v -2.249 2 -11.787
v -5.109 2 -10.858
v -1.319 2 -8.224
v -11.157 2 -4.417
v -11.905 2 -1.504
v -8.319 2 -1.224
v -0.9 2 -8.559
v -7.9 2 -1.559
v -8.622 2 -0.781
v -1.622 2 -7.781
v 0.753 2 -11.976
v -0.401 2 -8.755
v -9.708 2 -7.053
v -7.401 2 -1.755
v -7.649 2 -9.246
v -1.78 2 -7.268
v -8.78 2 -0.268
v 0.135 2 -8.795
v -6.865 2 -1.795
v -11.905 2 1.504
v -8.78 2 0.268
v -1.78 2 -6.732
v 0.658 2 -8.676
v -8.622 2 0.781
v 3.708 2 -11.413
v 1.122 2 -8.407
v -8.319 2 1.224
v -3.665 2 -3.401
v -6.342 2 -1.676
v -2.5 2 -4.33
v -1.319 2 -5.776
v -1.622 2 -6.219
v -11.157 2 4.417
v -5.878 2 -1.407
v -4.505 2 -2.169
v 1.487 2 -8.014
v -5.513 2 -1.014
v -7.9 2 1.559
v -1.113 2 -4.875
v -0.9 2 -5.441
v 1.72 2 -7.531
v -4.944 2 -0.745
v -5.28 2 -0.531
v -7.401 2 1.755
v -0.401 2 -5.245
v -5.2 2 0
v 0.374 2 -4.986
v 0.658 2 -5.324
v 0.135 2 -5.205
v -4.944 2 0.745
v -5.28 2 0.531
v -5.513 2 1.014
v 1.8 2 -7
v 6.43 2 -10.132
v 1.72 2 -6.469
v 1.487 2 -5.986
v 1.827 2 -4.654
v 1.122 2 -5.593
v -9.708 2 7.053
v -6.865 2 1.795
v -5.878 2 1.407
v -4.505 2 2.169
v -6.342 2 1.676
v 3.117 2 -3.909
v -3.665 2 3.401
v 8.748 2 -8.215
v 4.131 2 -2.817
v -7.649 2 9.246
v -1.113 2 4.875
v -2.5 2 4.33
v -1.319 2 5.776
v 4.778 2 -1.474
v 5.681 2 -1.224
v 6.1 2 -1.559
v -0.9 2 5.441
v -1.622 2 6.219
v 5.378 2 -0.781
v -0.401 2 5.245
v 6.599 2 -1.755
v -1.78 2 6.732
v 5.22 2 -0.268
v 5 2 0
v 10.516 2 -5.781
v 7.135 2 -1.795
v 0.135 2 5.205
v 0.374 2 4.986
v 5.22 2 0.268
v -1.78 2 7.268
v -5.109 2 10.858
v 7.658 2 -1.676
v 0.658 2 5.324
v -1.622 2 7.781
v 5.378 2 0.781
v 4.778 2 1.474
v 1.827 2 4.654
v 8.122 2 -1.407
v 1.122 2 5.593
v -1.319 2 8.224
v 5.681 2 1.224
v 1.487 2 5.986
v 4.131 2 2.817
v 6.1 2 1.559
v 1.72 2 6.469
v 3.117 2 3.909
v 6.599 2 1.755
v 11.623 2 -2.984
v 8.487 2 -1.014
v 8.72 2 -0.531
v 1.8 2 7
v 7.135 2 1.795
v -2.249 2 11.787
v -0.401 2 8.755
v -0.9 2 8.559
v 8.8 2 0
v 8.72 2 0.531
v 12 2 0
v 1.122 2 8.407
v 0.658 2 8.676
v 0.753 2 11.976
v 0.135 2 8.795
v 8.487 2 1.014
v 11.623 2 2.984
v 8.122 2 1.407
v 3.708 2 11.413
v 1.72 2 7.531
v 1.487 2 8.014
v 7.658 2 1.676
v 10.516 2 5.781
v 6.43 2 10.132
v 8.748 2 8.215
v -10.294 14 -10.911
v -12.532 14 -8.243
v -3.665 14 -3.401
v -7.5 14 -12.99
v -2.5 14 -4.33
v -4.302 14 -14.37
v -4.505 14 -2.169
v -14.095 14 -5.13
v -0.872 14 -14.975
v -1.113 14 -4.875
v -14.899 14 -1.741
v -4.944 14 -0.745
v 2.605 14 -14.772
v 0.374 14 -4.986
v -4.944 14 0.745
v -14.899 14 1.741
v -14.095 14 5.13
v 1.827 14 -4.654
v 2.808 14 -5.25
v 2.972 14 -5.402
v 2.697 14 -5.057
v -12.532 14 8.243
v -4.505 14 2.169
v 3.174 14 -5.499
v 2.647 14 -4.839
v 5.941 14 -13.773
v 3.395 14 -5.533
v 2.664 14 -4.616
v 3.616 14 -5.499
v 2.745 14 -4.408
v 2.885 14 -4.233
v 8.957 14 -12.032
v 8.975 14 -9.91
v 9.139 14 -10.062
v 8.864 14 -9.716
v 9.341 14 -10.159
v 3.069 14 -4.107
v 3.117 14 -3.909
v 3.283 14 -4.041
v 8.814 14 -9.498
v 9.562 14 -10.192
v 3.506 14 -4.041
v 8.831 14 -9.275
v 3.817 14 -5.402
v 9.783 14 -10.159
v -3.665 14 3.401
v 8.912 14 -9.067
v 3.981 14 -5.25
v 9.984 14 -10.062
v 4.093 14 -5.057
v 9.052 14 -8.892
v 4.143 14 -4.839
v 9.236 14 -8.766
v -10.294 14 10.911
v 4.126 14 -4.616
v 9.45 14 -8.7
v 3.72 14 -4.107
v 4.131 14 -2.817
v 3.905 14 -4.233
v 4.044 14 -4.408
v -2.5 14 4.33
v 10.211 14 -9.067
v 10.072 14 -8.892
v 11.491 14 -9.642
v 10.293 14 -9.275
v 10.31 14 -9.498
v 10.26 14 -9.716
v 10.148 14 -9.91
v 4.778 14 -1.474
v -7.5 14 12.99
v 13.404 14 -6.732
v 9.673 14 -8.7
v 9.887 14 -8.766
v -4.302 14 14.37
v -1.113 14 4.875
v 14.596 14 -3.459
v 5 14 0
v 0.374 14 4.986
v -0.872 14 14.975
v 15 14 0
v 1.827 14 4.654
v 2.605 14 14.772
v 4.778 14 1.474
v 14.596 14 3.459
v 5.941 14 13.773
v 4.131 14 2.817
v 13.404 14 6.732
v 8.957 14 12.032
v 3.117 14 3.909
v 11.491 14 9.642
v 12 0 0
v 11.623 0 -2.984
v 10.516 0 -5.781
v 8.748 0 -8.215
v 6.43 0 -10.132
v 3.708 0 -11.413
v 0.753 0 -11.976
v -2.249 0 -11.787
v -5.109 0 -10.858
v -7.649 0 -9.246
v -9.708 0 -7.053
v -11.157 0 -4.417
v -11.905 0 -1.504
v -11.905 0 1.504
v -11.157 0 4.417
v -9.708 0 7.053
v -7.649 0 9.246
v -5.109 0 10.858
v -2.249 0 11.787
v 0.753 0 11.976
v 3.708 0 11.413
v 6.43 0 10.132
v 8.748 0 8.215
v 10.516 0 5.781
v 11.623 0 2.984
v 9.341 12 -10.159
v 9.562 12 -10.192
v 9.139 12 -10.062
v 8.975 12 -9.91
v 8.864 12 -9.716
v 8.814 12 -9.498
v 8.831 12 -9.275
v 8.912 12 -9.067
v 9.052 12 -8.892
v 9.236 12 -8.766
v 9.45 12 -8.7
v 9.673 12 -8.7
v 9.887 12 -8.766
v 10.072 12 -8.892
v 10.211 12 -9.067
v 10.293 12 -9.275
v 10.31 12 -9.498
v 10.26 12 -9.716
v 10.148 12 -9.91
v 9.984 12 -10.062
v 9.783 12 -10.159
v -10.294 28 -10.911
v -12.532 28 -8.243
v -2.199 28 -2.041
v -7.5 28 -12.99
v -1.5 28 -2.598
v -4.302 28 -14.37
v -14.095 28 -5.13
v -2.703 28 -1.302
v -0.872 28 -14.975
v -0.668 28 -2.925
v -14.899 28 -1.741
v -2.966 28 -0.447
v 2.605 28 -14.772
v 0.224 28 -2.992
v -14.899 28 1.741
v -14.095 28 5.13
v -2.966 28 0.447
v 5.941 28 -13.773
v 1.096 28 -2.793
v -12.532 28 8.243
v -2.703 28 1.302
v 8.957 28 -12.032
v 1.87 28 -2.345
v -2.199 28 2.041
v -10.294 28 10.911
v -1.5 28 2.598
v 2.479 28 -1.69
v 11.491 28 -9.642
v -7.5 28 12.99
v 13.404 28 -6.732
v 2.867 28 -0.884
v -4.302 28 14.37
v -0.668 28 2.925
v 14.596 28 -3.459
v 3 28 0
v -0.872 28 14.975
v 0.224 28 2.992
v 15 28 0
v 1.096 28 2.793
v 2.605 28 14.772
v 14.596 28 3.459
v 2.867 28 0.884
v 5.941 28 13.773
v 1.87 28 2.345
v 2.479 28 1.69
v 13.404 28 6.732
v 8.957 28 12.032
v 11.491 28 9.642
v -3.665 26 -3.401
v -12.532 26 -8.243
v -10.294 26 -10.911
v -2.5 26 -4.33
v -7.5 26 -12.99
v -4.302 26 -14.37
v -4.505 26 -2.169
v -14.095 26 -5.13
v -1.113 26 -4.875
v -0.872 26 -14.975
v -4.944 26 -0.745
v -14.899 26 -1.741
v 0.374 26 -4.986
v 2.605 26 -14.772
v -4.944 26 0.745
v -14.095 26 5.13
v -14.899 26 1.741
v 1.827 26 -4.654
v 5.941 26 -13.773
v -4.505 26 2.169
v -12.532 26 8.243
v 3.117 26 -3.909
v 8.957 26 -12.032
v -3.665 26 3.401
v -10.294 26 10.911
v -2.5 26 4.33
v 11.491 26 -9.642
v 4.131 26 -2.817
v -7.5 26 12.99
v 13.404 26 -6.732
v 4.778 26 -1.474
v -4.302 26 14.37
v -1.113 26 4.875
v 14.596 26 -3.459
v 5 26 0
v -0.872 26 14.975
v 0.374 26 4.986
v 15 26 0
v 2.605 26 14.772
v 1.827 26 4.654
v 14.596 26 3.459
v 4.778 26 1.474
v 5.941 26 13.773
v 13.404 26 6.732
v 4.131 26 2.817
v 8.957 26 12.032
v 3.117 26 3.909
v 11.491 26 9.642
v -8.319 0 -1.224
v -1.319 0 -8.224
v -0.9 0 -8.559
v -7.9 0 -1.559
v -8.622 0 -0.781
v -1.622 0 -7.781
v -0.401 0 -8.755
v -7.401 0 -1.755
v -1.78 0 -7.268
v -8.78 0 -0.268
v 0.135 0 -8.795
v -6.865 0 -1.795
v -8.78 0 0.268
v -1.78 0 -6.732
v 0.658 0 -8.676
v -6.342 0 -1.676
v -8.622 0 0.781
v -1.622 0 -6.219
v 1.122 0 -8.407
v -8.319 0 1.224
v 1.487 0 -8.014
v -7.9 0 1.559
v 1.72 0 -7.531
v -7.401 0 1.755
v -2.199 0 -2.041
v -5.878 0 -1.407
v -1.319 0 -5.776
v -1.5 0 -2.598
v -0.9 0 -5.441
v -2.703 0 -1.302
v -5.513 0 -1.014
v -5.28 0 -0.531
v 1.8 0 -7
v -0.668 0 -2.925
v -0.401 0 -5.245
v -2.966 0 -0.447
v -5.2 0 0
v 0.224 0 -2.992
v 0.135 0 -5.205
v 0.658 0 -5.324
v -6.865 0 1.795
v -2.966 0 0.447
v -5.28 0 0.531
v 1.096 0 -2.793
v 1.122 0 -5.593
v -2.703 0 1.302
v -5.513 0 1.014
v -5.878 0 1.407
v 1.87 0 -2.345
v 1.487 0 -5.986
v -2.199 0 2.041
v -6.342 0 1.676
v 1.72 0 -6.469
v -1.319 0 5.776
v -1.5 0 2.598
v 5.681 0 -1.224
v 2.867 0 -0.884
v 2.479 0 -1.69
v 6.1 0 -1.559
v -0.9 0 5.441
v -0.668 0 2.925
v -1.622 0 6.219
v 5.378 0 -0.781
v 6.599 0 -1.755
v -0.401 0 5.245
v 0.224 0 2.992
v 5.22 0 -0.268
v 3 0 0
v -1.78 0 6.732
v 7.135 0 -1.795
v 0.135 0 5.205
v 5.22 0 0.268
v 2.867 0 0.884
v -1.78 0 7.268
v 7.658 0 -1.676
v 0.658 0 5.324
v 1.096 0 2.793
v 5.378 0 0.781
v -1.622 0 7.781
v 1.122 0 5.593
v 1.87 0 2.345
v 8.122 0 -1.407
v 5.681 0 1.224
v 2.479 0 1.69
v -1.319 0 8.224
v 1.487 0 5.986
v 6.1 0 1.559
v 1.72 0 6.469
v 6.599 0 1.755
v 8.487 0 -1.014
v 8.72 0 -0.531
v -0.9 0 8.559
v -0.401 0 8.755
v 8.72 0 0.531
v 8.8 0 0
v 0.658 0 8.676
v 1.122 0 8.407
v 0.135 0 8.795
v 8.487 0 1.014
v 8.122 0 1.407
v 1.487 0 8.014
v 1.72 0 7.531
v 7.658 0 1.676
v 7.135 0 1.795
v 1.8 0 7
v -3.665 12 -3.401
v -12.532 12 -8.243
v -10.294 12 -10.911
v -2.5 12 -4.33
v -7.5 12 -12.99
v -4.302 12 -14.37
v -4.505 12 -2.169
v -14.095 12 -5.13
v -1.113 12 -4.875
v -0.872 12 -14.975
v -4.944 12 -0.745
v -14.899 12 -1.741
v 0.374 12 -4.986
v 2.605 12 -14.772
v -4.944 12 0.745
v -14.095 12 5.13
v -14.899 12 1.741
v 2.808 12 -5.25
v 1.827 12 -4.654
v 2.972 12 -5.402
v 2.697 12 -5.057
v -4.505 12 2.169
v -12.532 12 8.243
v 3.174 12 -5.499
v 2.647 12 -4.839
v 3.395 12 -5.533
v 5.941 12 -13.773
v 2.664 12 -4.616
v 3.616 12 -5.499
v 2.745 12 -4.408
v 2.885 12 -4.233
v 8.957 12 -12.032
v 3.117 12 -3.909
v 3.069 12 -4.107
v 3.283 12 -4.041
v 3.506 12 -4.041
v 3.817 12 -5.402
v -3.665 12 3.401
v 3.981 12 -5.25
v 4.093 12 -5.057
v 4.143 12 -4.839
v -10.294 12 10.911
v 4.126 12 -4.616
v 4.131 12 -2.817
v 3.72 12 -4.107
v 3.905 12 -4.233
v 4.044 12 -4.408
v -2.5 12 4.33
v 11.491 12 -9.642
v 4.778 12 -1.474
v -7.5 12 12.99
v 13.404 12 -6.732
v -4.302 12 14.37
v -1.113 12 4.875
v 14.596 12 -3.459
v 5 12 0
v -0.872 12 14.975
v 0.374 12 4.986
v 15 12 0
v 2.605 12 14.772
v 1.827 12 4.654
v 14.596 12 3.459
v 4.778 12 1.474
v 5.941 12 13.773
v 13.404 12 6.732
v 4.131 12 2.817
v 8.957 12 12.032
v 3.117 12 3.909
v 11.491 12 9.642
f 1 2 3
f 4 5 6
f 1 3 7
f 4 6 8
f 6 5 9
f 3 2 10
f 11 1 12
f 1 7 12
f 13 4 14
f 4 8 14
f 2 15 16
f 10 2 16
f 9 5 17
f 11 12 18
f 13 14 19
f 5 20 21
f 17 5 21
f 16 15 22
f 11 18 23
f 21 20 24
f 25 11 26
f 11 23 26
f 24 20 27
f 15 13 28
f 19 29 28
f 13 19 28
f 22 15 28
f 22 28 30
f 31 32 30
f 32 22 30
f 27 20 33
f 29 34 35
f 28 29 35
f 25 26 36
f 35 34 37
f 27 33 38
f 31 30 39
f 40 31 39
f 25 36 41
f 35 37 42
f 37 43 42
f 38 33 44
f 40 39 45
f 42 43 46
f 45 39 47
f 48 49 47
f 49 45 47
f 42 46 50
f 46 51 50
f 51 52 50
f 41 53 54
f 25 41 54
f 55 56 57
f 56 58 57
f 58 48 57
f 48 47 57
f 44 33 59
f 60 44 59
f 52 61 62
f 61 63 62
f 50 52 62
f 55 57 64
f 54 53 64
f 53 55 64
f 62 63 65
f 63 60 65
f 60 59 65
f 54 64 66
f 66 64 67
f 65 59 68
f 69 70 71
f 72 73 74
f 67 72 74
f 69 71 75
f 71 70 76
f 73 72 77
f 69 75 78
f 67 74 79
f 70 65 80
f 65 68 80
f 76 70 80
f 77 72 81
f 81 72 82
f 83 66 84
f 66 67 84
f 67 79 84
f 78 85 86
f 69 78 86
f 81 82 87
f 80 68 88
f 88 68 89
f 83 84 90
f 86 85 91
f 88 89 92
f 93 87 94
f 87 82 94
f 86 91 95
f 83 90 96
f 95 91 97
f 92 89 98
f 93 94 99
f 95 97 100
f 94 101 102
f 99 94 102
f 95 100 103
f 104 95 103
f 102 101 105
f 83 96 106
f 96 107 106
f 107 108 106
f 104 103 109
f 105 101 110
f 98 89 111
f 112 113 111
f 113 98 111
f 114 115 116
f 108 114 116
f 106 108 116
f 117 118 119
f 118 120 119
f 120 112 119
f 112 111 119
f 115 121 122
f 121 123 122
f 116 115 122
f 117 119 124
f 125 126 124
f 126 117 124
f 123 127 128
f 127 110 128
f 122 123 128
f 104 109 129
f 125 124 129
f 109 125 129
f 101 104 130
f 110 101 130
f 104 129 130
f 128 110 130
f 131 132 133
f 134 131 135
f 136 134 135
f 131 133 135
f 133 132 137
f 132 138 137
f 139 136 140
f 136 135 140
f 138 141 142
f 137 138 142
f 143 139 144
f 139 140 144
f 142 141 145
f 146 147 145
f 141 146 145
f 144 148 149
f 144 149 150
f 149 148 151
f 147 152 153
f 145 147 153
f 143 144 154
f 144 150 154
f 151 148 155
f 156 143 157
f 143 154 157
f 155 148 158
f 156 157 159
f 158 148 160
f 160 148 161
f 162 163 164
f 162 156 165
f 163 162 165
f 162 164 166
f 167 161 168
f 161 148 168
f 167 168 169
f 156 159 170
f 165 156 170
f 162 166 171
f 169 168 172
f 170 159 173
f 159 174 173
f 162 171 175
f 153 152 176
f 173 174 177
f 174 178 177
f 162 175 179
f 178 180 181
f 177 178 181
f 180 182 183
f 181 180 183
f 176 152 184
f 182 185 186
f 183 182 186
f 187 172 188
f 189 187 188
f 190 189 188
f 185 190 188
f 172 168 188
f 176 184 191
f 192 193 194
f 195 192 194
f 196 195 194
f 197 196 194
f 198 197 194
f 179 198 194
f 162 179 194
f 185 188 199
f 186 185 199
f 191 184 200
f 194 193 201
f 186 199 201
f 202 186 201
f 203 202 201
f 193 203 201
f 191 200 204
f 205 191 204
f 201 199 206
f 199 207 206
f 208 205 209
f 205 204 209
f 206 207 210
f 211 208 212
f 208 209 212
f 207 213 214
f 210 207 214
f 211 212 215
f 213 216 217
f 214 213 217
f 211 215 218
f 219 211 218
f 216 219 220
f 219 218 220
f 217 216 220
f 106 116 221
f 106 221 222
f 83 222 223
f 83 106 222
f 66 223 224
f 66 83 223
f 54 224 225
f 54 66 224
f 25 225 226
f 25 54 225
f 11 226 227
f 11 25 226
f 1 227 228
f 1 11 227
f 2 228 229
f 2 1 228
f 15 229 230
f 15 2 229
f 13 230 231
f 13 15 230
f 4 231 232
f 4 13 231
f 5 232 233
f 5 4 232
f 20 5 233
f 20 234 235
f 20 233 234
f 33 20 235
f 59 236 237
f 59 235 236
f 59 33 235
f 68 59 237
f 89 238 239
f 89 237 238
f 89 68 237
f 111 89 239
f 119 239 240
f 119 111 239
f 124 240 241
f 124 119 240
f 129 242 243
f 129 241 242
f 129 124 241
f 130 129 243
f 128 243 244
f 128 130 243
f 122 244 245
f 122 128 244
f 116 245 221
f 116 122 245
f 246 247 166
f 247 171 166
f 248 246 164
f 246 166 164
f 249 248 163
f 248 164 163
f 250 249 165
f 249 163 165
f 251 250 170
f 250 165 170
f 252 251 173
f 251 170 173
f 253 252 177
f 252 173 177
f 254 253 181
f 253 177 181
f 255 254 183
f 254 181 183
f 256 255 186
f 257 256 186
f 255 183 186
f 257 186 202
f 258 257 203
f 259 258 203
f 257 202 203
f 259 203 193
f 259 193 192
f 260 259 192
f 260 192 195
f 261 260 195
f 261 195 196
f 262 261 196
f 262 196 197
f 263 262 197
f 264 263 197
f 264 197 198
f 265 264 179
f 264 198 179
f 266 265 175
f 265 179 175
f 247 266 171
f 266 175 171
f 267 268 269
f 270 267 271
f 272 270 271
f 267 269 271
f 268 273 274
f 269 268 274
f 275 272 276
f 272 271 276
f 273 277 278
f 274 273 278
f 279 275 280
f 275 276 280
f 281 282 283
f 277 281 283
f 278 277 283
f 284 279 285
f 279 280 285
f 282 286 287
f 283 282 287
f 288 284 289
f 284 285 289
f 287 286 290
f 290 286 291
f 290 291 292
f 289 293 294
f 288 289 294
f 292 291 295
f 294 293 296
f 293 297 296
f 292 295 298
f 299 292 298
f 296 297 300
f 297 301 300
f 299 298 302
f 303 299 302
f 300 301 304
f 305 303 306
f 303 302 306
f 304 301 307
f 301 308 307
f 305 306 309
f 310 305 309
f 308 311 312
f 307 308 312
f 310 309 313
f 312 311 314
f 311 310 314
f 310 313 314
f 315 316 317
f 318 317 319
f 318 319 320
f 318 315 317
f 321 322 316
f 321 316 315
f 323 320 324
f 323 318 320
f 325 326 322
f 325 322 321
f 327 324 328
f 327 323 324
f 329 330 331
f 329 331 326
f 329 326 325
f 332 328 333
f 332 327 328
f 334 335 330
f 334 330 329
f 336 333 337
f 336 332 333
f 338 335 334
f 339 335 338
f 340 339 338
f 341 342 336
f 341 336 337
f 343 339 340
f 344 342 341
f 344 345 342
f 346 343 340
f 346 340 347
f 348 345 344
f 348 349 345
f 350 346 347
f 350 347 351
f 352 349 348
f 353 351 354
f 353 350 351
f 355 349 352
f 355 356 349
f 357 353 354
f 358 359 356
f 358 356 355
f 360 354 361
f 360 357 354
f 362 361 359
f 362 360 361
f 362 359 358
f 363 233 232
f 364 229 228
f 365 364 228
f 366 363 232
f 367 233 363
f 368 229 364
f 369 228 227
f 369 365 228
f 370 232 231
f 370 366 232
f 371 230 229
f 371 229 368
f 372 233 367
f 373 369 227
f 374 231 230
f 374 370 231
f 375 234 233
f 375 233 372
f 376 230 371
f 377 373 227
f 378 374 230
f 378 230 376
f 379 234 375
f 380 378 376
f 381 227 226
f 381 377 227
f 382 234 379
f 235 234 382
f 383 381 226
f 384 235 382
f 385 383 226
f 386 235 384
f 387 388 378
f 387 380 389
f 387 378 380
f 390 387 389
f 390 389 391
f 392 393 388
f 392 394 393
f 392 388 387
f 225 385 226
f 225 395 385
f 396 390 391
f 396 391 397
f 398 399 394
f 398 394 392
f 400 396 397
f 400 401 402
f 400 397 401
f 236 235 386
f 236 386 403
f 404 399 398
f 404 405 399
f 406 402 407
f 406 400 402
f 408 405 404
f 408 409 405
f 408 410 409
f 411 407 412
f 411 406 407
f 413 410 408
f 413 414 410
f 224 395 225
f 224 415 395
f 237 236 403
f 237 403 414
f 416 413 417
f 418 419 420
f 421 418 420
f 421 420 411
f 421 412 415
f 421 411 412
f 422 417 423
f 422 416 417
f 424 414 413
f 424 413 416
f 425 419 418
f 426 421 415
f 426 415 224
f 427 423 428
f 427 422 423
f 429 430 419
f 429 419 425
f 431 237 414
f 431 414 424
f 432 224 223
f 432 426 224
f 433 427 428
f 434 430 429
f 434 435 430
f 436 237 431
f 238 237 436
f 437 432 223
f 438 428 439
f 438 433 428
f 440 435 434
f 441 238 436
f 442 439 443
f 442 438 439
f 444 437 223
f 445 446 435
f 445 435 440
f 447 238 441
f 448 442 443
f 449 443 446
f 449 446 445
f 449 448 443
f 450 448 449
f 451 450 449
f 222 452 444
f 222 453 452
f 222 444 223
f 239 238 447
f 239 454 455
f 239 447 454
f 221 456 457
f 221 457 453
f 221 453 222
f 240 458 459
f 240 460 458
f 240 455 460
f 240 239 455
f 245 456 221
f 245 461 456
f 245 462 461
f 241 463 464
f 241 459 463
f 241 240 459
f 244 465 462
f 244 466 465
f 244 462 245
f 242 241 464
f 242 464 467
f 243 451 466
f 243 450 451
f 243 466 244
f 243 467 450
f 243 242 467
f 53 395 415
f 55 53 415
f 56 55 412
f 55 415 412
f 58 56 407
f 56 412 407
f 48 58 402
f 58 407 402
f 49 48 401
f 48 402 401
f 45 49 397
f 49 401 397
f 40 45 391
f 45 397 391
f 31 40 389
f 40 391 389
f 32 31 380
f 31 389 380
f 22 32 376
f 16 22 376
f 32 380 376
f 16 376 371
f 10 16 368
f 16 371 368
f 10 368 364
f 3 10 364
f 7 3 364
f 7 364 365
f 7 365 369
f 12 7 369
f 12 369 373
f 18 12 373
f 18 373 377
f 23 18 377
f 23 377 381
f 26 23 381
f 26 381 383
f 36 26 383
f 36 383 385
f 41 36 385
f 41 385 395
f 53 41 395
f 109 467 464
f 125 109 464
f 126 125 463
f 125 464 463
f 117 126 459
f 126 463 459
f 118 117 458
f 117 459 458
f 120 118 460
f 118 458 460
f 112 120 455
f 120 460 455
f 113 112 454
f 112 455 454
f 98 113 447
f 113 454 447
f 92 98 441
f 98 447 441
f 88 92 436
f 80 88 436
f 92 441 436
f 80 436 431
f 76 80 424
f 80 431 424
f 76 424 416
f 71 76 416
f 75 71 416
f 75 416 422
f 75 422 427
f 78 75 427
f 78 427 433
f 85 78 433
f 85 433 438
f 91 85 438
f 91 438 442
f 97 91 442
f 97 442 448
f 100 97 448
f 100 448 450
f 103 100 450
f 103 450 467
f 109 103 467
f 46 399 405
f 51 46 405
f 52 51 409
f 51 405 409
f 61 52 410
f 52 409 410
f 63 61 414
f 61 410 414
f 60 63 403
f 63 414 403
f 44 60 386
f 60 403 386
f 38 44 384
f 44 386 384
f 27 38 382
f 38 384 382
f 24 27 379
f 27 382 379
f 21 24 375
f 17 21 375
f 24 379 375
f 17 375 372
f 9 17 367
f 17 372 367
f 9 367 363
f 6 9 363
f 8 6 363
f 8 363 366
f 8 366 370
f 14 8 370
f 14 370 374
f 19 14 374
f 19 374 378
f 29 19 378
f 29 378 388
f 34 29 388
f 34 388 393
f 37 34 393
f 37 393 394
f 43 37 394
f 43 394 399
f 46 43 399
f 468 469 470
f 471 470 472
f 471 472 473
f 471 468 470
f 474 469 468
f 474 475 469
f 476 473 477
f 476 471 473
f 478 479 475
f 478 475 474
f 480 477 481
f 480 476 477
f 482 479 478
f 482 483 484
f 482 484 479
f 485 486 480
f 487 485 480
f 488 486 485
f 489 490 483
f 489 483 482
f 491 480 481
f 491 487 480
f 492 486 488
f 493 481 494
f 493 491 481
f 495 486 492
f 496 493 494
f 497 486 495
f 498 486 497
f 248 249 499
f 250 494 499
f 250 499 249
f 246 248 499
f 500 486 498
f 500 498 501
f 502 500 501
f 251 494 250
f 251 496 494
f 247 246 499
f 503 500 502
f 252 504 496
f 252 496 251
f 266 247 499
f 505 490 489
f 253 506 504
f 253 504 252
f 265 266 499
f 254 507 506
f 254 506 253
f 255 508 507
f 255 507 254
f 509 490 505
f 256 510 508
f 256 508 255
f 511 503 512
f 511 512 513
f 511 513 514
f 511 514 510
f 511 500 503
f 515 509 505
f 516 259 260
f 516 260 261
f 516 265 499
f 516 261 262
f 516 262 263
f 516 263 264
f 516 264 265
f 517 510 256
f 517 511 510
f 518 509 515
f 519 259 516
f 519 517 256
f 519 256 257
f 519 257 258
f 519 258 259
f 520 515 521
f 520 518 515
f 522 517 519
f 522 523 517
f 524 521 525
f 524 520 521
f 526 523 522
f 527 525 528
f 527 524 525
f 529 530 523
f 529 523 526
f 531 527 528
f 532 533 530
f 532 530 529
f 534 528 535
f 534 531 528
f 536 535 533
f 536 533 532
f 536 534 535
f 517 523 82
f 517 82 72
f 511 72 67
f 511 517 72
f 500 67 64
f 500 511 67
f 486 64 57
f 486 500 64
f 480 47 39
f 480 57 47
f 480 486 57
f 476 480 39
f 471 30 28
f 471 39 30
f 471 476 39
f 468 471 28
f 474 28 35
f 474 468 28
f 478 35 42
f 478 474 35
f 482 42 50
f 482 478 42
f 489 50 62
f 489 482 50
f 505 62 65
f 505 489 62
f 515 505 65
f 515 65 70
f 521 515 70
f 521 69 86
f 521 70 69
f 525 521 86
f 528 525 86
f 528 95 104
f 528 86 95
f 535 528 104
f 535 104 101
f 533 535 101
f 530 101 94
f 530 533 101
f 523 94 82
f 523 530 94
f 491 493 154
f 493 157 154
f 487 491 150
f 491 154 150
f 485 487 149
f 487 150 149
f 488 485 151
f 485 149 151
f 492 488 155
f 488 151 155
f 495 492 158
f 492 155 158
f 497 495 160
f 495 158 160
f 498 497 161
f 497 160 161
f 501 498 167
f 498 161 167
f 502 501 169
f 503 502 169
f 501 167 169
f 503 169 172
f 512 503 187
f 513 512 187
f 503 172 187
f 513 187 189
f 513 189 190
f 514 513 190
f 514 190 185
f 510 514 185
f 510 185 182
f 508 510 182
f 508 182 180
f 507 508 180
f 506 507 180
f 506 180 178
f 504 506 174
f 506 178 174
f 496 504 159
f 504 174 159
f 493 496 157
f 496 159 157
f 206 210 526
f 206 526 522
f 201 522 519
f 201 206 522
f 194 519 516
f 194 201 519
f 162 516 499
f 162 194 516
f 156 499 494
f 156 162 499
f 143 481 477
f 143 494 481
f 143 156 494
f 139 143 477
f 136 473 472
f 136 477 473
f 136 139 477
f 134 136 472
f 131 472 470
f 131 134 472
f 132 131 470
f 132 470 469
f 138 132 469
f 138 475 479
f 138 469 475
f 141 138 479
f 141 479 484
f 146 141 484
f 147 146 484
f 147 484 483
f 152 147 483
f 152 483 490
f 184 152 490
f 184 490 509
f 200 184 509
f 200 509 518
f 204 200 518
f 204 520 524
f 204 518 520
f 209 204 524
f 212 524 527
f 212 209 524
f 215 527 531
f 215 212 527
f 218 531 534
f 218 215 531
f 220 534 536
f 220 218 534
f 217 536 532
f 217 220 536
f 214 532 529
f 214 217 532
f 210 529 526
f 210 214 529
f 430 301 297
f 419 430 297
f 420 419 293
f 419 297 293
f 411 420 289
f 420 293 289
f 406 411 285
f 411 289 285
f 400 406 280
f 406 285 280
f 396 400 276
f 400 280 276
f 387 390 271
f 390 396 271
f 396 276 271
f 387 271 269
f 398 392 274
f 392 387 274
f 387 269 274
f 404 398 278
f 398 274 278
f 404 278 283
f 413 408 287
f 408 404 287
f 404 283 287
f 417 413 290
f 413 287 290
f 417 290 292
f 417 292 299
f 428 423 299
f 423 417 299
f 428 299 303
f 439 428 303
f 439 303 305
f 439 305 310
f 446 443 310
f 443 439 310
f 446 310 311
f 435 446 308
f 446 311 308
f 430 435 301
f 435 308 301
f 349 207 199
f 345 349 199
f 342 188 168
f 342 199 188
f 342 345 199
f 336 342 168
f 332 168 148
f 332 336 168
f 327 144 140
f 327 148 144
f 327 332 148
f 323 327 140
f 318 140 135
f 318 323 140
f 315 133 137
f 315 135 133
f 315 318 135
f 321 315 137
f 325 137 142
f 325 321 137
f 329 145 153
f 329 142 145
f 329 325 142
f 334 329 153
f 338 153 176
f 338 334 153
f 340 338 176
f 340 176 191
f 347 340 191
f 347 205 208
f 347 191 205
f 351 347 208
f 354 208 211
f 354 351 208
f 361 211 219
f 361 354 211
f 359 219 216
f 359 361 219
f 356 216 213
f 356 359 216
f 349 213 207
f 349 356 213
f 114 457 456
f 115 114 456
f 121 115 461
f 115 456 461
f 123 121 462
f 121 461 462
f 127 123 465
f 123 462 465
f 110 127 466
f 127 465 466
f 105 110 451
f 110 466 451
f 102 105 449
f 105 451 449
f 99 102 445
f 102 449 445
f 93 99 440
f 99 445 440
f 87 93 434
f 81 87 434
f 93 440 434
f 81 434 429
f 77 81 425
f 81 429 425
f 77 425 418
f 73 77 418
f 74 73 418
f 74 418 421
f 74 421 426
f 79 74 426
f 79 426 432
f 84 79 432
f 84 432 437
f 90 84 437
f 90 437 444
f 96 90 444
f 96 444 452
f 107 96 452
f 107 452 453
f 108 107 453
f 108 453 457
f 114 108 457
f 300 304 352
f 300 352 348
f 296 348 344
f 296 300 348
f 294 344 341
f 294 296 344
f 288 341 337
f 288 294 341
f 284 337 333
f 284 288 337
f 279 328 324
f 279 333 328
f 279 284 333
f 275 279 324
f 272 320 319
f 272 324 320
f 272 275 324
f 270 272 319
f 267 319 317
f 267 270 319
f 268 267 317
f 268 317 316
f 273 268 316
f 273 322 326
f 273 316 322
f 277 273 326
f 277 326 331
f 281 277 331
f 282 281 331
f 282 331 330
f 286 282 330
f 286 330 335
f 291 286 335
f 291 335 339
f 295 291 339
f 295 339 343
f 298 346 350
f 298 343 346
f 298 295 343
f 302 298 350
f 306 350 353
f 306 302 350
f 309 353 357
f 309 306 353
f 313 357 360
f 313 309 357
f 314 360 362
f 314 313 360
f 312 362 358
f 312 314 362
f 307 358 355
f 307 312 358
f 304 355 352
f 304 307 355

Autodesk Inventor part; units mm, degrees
ref_plane "YZ Plane" through (0, 0, 0) normal (1, 0, 0) x (0, 1, 0)
ref_plane "XZ Plane" through (0, 0, 0) normal (0, 1, 0) x (-1, 0, 0)
ref_plane "XY Plane" through (0, 0, 0) normal (0, 0, 1) x (1, 0, 0)
sketch "Sketch1" plane through (0, 0, 0) normal (0, 0, 1) x (1, 0, 0)
  line L0 (0, 24) -> (0, 0)
  line L1 (3, 0) -> (3, 28)
  line L2 (3, 0) -> (12, 0)
  line L3 (12, 0) -> (12, 2)
  line L4 (12, 2) -> (5, 2)
  line L5 (5, 2) -> (5, 12)
  line L6 (5, 12) -> (15, 12)
  line L7 (15, 12) -> (15, 14)
  line L8 (15, 14) -> (5, 14)
  line L9 (5, 14) -> (5, 26)
  line L10 (5, 26) -> (15, 26)
  line L11 (15, 26) -> (15, 28)
  line L12 (15, 28) -> (3, 28)
  dimension "d1" = 6
  dimension "d2" = 9
  dimension "d3" = 2
  dimension "d4" = 7
  dimension "d5" = 2
  dimension "d6" = 10
  dimension "d7" = 2
  dimension "d8" = 2
  dimension "d9" = 28
  dimension "d10" = 12
  dimension "d11" = 10
  dimension "d17" = 26
  dimension "d18" = 2
revolve "Revolution1" add sketch "Sketch1" angle 360 about axis through (0, 24, 0) along (0, -1, 0)
sketch "Sketch2" plane through (0, 0, 0) normal (0, -1, 0) x (1, 0, 0)
  circle A0 centre (0, -7) radius 1.8
  circle A1 centre (7, 0) radius 1.8
  circle A2 centre (0, 7) radius 1.8
  circle A3 centre (-7, 0) radius 1.8
  point P0 (0, 0)
  dimension "d20" = 3.6
  dimension "d21" = 7
  dimension "d24" = 360
extrude "Extrusion1" cut sketch "Sketch2" against normal blind 2
sketch "Sketch3" plane through (0, 12, 0) normal (0, -1, 0) x (1, 0, 0)
  point P0 (0, 0)
  point P1 (3.3947, -4.7826)
hole "Hole1" at (3.3947, 12, -4.7826) direction (0, 1, 0) diameter 1.5 depth 2
sketch "Sketch4" plane through (0, 12, 0) normal (0, -1, 0) x (1, 0, 0)
  point P0 (0, 0)
  point P1 (9.5617, -9.4421)
hole "Hole2" at (9.5617, 12, -9.4421) direction (0, 1, 0) diameter 1.5 depth 2
properties part number "SpoolMk2"
